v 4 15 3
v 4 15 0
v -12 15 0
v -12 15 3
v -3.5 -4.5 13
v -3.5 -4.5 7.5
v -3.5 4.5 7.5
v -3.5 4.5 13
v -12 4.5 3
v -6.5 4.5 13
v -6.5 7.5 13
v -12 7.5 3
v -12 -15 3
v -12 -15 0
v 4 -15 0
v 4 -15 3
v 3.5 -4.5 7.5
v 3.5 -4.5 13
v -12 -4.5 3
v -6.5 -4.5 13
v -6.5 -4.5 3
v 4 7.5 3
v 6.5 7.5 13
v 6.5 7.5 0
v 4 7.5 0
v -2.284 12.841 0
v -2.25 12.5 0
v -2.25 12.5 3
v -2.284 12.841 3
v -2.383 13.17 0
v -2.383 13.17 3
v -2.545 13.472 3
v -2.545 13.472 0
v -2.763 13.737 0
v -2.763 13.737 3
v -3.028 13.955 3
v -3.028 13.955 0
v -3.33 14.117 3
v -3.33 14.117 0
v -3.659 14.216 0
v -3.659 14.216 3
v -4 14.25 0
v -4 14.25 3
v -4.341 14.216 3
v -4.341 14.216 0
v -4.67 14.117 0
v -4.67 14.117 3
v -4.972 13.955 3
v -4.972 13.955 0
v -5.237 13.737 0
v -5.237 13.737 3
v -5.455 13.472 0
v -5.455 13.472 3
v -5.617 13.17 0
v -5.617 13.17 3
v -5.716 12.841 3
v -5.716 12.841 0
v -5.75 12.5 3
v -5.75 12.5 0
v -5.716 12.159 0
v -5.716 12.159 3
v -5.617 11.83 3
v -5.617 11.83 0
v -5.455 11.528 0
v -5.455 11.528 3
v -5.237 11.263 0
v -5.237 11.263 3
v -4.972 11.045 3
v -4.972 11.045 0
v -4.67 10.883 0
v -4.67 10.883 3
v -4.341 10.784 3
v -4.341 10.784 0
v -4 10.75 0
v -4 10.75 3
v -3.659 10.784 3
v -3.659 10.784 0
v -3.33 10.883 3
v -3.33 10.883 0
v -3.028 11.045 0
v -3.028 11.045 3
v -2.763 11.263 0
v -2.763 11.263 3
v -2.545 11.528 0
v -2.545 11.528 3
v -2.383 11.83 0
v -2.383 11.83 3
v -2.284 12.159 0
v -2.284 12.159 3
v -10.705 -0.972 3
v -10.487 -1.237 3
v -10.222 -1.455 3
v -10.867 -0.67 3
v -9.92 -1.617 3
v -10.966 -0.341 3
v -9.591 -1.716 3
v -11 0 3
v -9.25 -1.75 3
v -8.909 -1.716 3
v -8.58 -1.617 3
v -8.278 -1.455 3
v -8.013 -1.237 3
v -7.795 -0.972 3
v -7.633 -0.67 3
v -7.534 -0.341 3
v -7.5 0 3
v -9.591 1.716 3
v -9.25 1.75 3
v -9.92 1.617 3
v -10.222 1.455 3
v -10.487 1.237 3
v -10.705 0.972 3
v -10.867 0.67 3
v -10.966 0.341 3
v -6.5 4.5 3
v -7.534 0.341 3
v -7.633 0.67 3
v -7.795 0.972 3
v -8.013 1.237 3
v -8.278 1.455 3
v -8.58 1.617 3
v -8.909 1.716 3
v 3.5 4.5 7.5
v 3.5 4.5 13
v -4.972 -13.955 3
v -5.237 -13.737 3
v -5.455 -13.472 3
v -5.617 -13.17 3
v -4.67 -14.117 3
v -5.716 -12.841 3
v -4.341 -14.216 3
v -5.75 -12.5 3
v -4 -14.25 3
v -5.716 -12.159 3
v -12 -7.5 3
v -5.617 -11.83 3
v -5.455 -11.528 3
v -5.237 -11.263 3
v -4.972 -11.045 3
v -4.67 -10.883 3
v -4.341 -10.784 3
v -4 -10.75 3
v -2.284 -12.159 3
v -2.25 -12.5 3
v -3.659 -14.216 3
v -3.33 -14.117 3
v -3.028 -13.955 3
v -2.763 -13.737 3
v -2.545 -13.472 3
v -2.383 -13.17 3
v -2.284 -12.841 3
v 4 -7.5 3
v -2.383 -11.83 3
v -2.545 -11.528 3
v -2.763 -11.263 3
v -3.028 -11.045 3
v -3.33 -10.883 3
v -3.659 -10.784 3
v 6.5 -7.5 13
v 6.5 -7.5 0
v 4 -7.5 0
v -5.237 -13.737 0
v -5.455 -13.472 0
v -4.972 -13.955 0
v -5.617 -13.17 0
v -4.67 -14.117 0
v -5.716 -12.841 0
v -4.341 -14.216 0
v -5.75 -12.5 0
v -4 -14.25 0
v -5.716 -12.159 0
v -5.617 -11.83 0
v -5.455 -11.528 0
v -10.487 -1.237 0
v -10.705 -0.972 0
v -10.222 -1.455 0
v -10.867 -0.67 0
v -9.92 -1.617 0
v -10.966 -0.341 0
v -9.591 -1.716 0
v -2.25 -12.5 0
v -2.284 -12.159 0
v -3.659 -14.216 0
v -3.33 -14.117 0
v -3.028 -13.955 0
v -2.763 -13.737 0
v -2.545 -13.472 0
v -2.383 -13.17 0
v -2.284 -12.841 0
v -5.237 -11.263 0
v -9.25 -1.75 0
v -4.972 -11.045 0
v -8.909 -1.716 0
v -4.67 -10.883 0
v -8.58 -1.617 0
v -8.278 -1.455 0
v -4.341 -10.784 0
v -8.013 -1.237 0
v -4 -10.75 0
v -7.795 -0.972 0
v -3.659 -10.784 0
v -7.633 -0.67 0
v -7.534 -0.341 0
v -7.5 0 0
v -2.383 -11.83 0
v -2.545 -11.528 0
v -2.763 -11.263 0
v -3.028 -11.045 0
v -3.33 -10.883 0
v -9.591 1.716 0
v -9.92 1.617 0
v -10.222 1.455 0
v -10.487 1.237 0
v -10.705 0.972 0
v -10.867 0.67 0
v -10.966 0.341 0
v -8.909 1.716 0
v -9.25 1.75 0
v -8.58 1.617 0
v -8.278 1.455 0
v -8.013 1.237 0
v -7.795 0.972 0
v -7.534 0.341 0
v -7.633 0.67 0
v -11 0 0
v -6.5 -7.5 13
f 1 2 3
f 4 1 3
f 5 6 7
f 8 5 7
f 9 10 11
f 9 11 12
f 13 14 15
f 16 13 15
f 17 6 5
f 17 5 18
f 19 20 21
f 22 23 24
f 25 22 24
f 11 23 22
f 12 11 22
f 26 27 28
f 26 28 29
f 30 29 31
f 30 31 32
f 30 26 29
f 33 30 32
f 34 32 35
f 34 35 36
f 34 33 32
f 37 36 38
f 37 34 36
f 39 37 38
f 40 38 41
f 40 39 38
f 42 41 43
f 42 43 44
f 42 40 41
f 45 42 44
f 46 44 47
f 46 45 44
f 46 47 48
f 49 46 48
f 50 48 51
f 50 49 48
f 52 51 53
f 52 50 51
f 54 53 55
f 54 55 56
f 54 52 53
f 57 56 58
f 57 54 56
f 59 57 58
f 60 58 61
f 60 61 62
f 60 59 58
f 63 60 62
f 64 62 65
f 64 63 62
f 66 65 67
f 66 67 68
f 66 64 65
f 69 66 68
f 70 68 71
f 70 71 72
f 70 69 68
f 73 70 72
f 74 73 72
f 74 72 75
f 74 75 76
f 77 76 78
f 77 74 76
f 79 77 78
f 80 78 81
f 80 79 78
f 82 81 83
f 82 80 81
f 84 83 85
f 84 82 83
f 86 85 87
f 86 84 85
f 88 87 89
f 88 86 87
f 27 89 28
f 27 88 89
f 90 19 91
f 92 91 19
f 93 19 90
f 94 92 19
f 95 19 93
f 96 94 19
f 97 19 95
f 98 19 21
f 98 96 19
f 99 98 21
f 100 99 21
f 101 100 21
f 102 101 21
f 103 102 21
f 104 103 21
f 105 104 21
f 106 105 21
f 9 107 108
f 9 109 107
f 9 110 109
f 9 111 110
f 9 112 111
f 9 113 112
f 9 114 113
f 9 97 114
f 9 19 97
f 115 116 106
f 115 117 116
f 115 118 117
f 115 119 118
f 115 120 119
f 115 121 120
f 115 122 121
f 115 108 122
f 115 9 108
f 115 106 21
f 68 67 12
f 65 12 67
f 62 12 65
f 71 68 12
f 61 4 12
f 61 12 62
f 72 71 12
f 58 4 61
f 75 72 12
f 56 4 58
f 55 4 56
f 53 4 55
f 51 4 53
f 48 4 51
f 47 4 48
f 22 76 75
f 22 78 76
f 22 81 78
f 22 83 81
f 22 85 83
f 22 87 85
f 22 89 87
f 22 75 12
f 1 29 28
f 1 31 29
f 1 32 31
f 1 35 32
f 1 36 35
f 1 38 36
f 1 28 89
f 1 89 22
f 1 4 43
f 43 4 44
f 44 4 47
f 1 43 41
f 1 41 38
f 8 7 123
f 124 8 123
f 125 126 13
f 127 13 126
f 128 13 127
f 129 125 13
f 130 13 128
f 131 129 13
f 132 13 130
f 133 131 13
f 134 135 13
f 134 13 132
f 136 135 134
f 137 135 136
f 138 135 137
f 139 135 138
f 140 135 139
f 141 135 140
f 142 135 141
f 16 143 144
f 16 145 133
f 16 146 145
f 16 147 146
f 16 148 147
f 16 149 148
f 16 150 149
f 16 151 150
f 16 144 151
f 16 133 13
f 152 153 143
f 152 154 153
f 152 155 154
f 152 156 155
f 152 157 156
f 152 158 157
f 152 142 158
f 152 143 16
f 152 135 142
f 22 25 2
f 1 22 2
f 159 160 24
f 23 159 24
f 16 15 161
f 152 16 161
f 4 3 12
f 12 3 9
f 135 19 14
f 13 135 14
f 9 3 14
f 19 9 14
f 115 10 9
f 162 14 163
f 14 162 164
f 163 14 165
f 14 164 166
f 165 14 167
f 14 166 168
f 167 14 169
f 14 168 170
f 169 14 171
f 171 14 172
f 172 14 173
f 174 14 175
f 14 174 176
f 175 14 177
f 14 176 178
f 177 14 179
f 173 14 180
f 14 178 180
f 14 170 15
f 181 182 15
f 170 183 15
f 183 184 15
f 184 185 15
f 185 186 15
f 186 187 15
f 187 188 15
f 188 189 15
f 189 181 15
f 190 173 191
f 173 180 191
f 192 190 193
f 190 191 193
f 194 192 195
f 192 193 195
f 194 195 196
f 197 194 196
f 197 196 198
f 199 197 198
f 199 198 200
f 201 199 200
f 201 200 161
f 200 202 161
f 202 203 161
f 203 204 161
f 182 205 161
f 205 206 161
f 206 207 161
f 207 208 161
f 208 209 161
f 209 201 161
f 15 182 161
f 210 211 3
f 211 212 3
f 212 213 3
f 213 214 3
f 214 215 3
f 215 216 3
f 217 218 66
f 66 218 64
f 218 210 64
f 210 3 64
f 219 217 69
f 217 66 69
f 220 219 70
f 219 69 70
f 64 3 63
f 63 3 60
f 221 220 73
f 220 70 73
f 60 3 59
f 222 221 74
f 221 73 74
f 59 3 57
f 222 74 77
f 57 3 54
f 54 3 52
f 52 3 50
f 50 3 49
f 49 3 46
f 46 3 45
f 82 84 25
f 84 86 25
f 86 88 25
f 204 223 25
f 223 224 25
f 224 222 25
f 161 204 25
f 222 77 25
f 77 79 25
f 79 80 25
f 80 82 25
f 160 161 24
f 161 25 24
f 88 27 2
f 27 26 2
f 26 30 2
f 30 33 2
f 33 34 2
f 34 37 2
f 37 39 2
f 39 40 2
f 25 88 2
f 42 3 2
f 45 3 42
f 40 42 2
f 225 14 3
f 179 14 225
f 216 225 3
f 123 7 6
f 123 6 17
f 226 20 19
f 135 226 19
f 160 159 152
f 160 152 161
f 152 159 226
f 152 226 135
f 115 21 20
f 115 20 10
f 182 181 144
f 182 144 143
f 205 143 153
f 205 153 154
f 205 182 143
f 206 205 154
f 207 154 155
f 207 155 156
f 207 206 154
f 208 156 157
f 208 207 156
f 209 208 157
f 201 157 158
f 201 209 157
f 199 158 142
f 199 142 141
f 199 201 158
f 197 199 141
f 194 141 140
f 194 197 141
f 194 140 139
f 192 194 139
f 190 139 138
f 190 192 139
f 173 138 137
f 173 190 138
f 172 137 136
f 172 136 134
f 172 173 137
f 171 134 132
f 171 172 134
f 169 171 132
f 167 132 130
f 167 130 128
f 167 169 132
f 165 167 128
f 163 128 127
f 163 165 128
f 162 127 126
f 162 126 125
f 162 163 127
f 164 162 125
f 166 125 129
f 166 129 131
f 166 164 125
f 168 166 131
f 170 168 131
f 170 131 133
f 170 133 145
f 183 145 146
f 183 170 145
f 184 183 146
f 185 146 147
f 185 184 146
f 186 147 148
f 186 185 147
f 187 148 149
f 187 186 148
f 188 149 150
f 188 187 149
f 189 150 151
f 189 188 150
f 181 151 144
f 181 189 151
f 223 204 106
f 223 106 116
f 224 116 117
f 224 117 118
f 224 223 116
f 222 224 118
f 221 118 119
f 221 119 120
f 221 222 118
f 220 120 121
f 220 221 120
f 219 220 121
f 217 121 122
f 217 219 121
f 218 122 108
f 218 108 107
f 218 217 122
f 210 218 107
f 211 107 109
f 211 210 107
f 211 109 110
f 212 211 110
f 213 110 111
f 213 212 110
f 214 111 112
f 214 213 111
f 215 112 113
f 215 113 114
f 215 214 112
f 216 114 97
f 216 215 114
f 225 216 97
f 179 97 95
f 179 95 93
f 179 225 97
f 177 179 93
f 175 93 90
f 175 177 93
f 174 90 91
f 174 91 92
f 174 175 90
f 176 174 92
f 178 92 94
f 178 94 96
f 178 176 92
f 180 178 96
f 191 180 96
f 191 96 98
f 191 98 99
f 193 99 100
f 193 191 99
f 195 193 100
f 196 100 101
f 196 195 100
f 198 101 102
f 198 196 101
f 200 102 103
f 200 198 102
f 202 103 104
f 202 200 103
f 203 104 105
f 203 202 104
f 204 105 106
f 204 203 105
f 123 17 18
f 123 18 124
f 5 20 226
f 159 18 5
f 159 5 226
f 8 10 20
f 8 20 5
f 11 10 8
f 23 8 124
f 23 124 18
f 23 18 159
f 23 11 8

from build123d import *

# Parameters (mm, degrees)
ESQUISSE1_R        = 1.75
BOSS_EXTRU_1_DEPTH = 3
ESQUISSE1_3_W      = 7
ESQUISSE1_3_H      = 9
BOSS_EXTRU_2_DEPTH = 13
NERVURE2_REACH     = 30.623
ESQUISSE5_WALL_W   = 70.657799336
ESQUISSE5_WALL_H   = 3
ESQUISSE1_4_W      = 7
ESQUISSE1_4_H      = 9
BOSS_EXTRU_3_DEPTH = 7.5


with BuildPart() as part:
    # Esquisse1 → Boss.-Extru.1 (new body)
    with BuildSketch(Plane.XY):
        Polygon((-6.5, -7.5), (-6.5, 7.5), (4, 7.5), (4, 15), (-12, 15), (-12, -15), (4, -15), (4, -7.5), align=None)
        with Locations((-9.25, 0)):
            Circle(ESQUISSE1_R, mode=Mode.SUBTRACT)
        with Locations((-4, -12.5)):
            Circle(ESQUISSE1_R, mode=Mode.SUBTRACT)
        with Locations((-4, 12.5)):
            Circle(ESQUISSE1_R, mode=Mode.SUBTRACT)
    extrude(amount=BOSS_EXTRU_1_DEPTH)

    # Esquisse1<3> → Boss.-Extru.2 (add)
    with BuildSketch(Plane.XY):
        Polygon((4, 7.5), (-6.5, 7.5), (-6.5, -7.5), (4, -7.5), (6.5, -7.5), (6.5, 7.5), align=None)
        Rectangle(ESQUISSE1_3_W, ESQUISSE1_3_H, mode=Mode.SUBTRACT)
    extrude(amount=BOSS_EXTRU_2_DEPTH)

    # Esquisse5 wall → Nervure2 (add, up to next)
    with BuildSketch(Plane(origin=(-9.25, -7.5, 8), x_dir=(-0.481918749772, 0, -0.876215908677), z_dir=(0.876215908677, 0, -0.481918749772)), mode=Mode.PRIVATE) as nervure2_sk1:
        with Locations((0, 1.5)):
            Rectangle(ESQUISSE5_WALL_W, ESQUISSE5_WALL_H)
    nervure2_tool1 = extrude(nervure2_sk1.sketch, amount=NERVURE2_REACH, mode=Mode.PRIVATE) - part.part
    nervure2 = nervure2_tool1.solids().sort_by_distance((-9.25, -7.5, 8))[0]
    add(nervure2)

    # Symétrie4: Nervure2 across plane
    add(nervure2.mirror(Plane.ZX))

    # Esquisse1<4> → Boss.-Extru.3 (add)
    with BuildSketch(Plane.XY):
        Rectangle(ESQUISSE1_4_W, ESQUISSE1_4_H)
    extrude(amount=BOSS_EXTRU_3_DEPTH)


solid = part.part
